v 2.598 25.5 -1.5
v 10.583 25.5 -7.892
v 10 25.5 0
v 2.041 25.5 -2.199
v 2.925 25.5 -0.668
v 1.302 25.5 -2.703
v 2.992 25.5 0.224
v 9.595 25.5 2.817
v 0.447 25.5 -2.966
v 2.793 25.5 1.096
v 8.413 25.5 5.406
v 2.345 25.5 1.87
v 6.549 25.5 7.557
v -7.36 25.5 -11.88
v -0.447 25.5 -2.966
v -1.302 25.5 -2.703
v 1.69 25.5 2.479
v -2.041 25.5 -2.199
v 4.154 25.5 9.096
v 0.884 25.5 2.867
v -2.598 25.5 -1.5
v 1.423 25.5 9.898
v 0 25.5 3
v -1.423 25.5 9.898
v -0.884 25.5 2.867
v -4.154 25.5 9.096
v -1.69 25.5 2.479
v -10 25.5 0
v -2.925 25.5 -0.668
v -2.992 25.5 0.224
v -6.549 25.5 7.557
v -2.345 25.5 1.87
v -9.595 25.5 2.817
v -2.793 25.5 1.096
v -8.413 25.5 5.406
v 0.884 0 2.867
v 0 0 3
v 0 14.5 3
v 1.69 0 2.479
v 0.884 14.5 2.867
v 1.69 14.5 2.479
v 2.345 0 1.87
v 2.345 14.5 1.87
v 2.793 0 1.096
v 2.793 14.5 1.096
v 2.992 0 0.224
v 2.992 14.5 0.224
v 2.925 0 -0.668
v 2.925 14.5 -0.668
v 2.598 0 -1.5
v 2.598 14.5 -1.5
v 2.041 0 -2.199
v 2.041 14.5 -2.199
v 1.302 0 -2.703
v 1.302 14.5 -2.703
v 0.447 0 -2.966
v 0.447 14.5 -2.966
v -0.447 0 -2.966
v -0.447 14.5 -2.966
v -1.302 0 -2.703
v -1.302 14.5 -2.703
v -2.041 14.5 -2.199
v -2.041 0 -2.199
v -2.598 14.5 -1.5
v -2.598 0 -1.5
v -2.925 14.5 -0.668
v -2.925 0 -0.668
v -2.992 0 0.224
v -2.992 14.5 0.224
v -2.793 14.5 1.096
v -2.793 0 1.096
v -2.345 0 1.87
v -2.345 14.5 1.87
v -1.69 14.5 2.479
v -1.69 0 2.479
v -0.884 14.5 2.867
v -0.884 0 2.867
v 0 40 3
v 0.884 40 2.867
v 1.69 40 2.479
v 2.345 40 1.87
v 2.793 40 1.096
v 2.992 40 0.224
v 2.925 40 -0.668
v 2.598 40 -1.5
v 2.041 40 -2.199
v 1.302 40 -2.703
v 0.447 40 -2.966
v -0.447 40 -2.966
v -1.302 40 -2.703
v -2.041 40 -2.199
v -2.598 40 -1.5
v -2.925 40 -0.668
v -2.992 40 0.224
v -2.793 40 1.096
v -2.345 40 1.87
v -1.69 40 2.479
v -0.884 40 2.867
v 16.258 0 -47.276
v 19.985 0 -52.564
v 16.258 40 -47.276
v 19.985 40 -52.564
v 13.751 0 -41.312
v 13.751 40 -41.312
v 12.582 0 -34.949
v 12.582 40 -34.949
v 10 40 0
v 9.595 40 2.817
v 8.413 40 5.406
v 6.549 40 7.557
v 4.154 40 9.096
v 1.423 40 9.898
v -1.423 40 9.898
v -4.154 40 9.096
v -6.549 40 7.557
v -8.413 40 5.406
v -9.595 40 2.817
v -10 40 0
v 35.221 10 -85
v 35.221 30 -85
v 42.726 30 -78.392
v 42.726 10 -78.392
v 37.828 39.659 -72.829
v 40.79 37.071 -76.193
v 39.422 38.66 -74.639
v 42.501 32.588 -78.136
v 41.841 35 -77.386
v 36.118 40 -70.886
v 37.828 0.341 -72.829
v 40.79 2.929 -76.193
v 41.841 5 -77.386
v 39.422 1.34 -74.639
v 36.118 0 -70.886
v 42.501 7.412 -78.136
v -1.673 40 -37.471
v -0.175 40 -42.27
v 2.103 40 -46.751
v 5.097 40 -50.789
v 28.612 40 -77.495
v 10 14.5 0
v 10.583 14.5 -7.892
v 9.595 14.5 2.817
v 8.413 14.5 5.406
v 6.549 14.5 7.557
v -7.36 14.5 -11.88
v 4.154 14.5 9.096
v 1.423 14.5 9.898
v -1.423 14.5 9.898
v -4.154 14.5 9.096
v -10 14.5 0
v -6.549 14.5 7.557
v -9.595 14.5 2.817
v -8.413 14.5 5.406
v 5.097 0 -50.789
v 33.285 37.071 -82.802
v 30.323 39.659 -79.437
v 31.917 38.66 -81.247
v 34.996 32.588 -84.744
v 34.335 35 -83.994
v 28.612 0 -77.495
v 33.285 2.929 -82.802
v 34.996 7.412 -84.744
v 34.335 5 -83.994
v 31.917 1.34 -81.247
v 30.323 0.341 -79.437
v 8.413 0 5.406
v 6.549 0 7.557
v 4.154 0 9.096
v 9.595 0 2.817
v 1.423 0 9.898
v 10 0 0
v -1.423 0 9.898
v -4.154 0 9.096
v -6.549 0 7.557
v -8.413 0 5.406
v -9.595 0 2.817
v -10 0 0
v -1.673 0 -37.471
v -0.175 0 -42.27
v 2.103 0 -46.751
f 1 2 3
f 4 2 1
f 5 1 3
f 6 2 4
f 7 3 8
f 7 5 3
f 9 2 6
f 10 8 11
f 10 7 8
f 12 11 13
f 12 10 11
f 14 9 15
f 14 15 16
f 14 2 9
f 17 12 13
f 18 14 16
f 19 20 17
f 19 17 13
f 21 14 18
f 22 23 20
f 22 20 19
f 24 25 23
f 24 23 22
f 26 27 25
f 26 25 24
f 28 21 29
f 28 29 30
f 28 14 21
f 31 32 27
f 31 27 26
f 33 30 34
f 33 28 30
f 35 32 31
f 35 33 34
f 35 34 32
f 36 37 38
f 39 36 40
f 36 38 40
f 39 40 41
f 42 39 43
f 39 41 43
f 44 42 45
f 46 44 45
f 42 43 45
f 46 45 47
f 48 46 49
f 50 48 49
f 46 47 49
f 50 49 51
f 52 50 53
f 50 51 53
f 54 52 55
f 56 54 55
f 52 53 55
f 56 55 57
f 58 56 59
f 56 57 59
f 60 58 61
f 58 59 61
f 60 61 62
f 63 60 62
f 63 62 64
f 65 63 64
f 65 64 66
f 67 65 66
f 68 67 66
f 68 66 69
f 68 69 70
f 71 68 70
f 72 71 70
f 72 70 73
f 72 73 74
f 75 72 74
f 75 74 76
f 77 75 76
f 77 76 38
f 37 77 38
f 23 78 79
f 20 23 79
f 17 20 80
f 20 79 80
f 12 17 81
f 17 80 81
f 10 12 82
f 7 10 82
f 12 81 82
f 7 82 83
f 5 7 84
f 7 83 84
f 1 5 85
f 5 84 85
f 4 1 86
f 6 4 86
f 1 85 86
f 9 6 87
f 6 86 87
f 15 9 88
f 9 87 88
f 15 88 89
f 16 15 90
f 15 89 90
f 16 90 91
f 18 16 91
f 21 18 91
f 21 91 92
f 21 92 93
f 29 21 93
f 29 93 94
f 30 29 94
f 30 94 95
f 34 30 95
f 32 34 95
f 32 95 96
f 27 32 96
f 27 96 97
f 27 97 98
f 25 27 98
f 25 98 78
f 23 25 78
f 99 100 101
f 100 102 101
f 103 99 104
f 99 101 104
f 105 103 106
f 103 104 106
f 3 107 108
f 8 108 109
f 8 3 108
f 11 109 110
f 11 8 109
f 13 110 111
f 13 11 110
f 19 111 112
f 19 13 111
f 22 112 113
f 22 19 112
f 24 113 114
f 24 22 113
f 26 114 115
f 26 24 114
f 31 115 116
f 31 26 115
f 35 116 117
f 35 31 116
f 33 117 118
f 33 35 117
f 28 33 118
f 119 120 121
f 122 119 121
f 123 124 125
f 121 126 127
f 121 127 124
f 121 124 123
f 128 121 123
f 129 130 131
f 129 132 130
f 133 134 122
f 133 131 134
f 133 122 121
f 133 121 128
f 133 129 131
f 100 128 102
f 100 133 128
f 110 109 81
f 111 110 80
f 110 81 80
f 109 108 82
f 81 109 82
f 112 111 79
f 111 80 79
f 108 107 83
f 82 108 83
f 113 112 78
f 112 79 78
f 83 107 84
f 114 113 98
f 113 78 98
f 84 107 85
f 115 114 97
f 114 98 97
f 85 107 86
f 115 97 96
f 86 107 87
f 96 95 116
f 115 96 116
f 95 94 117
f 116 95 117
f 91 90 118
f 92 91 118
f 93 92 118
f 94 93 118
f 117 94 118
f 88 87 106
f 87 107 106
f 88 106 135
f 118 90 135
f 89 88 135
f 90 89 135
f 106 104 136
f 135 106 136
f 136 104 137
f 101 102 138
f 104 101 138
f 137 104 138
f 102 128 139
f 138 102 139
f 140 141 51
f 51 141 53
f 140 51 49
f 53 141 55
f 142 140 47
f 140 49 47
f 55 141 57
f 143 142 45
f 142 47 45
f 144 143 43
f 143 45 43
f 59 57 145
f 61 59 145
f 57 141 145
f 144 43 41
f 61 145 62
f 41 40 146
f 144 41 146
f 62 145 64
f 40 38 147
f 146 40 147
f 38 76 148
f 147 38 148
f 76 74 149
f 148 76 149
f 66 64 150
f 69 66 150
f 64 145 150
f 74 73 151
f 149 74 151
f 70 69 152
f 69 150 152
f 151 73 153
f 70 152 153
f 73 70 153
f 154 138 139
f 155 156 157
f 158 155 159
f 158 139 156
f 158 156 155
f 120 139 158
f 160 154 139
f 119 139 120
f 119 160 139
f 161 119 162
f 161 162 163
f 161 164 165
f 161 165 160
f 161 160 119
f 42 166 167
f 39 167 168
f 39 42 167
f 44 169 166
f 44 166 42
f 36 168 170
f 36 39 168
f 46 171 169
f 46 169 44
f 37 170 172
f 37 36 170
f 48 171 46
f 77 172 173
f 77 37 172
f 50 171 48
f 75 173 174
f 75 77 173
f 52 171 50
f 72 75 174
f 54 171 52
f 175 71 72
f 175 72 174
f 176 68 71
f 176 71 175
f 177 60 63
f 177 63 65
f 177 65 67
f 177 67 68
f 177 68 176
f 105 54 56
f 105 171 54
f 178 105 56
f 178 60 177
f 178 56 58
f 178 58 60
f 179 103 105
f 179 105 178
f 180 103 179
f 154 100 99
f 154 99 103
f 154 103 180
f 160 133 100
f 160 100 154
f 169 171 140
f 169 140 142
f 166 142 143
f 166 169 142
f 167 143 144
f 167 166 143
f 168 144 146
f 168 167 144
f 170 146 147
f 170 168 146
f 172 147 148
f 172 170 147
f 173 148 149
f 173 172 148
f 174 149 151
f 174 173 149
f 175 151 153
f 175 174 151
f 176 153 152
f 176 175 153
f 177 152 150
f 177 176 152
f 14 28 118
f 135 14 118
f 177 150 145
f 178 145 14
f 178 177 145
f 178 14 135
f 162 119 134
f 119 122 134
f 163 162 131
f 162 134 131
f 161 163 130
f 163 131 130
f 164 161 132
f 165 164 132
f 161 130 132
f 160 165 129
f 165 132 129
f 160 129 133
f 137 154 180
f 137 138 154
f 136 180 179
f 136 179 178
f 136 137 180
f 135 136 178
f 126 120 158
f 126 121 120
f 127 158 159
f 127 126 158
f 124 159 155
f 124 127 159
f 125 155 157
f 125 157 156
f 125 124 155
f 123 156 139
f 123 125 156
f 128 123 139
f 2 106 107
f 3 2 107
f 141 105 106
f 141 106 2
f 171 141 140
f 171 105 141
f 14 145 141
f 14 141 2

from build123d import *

# Parameters (mm, degrees)
BOSS_EXTRUDE1_DEPTH = 40
FILLET1_R           = 10
FILLET2_R           = 30
FILLET3_R           = 30
SKETCH3_R           = 3
CUT_EXTRUDE1_DEPTH  = 50
SKETCH5_W           = 20
SKETCH5_H           = 11
CUT_EXTRUDE2_DEPTH  = 50


with BuildPart() as part:
    # Sketch2 → Boss-Extrude1 (new body)
    with BuildSketch(Plane(origin=(0, 0, 0), x_dir=(1, 0, 0), z_dir=(0, 1, 0))):
        with BuildLine():
            Line((-10, 0), (0, 45))
            Line((0, 45), (35.22081686, 85))
            Line((35.22081686, 85), (42.726014623, 78.391520103))
            Line((42.726014623, 78.391520103), (13.324099267, 45))
            Line((13.324099267, 45), (10, 0))
            ThreePointArc((10, 0), (0, -10), (-10, 0))
        make_face()
    extrude(amount=BOSS_EXTRUDE1_DEPTH)

    # Fillet1
    fillet1_edges = [part.edges().sort_by_distance(p)[0] for p in [
        (38.973415741, 0, -81.695760051),
        (38.973415741, 40, -81.695760051),
    ]]
    fillet(fillet1_edges, radius=FILLET1_R)

    # Fillet2
    fillet2_edges = [part.edges().sort_by_distance(p)[0] for p in [
        (0, 20, -45),
    ]]
    fillet(fillet2_edges, radius=FILLET2_R)

    # Fillet3
    fillet3_edges = [part.edges().sort_by_distance(p)[0] for p in [
        (13.324099267, 20, -45),
    ]]
    fillet(fillet3_edges, radius=FILLET3_R)

    # Sketch3 → Cut-Extrude1 (cut)
    with BuildSketch(Plane(origin=(0, 40, 0), x_dir=(1, 0, 0), z_dir=(0, 1, 0))):
        Circle(SKETCH3_R)
    extrude(amount=-CUT_EXTRUDE1_DEPTH, mode=Mode.SUBTRACT)

    # Sketch5 → Cut-Extrude2 (cut)
    with BuildSketch(Plane(origin=(-9.529411765, 0, -2.117647059), x_dir=(-0.21693045781865625, 0, 0.9761870601839528), z_dir=(-0.9761870601839528, 0, -0.21693045781865625))):
        with Locations((0, 20)):
            Rectangle(SKETCH5_W, SKETCH5_H)
    extrude(amount=-CUT_EXTRUDE2_DEPTH, mode=Mode.SUBTRACT)


solid = part.part
